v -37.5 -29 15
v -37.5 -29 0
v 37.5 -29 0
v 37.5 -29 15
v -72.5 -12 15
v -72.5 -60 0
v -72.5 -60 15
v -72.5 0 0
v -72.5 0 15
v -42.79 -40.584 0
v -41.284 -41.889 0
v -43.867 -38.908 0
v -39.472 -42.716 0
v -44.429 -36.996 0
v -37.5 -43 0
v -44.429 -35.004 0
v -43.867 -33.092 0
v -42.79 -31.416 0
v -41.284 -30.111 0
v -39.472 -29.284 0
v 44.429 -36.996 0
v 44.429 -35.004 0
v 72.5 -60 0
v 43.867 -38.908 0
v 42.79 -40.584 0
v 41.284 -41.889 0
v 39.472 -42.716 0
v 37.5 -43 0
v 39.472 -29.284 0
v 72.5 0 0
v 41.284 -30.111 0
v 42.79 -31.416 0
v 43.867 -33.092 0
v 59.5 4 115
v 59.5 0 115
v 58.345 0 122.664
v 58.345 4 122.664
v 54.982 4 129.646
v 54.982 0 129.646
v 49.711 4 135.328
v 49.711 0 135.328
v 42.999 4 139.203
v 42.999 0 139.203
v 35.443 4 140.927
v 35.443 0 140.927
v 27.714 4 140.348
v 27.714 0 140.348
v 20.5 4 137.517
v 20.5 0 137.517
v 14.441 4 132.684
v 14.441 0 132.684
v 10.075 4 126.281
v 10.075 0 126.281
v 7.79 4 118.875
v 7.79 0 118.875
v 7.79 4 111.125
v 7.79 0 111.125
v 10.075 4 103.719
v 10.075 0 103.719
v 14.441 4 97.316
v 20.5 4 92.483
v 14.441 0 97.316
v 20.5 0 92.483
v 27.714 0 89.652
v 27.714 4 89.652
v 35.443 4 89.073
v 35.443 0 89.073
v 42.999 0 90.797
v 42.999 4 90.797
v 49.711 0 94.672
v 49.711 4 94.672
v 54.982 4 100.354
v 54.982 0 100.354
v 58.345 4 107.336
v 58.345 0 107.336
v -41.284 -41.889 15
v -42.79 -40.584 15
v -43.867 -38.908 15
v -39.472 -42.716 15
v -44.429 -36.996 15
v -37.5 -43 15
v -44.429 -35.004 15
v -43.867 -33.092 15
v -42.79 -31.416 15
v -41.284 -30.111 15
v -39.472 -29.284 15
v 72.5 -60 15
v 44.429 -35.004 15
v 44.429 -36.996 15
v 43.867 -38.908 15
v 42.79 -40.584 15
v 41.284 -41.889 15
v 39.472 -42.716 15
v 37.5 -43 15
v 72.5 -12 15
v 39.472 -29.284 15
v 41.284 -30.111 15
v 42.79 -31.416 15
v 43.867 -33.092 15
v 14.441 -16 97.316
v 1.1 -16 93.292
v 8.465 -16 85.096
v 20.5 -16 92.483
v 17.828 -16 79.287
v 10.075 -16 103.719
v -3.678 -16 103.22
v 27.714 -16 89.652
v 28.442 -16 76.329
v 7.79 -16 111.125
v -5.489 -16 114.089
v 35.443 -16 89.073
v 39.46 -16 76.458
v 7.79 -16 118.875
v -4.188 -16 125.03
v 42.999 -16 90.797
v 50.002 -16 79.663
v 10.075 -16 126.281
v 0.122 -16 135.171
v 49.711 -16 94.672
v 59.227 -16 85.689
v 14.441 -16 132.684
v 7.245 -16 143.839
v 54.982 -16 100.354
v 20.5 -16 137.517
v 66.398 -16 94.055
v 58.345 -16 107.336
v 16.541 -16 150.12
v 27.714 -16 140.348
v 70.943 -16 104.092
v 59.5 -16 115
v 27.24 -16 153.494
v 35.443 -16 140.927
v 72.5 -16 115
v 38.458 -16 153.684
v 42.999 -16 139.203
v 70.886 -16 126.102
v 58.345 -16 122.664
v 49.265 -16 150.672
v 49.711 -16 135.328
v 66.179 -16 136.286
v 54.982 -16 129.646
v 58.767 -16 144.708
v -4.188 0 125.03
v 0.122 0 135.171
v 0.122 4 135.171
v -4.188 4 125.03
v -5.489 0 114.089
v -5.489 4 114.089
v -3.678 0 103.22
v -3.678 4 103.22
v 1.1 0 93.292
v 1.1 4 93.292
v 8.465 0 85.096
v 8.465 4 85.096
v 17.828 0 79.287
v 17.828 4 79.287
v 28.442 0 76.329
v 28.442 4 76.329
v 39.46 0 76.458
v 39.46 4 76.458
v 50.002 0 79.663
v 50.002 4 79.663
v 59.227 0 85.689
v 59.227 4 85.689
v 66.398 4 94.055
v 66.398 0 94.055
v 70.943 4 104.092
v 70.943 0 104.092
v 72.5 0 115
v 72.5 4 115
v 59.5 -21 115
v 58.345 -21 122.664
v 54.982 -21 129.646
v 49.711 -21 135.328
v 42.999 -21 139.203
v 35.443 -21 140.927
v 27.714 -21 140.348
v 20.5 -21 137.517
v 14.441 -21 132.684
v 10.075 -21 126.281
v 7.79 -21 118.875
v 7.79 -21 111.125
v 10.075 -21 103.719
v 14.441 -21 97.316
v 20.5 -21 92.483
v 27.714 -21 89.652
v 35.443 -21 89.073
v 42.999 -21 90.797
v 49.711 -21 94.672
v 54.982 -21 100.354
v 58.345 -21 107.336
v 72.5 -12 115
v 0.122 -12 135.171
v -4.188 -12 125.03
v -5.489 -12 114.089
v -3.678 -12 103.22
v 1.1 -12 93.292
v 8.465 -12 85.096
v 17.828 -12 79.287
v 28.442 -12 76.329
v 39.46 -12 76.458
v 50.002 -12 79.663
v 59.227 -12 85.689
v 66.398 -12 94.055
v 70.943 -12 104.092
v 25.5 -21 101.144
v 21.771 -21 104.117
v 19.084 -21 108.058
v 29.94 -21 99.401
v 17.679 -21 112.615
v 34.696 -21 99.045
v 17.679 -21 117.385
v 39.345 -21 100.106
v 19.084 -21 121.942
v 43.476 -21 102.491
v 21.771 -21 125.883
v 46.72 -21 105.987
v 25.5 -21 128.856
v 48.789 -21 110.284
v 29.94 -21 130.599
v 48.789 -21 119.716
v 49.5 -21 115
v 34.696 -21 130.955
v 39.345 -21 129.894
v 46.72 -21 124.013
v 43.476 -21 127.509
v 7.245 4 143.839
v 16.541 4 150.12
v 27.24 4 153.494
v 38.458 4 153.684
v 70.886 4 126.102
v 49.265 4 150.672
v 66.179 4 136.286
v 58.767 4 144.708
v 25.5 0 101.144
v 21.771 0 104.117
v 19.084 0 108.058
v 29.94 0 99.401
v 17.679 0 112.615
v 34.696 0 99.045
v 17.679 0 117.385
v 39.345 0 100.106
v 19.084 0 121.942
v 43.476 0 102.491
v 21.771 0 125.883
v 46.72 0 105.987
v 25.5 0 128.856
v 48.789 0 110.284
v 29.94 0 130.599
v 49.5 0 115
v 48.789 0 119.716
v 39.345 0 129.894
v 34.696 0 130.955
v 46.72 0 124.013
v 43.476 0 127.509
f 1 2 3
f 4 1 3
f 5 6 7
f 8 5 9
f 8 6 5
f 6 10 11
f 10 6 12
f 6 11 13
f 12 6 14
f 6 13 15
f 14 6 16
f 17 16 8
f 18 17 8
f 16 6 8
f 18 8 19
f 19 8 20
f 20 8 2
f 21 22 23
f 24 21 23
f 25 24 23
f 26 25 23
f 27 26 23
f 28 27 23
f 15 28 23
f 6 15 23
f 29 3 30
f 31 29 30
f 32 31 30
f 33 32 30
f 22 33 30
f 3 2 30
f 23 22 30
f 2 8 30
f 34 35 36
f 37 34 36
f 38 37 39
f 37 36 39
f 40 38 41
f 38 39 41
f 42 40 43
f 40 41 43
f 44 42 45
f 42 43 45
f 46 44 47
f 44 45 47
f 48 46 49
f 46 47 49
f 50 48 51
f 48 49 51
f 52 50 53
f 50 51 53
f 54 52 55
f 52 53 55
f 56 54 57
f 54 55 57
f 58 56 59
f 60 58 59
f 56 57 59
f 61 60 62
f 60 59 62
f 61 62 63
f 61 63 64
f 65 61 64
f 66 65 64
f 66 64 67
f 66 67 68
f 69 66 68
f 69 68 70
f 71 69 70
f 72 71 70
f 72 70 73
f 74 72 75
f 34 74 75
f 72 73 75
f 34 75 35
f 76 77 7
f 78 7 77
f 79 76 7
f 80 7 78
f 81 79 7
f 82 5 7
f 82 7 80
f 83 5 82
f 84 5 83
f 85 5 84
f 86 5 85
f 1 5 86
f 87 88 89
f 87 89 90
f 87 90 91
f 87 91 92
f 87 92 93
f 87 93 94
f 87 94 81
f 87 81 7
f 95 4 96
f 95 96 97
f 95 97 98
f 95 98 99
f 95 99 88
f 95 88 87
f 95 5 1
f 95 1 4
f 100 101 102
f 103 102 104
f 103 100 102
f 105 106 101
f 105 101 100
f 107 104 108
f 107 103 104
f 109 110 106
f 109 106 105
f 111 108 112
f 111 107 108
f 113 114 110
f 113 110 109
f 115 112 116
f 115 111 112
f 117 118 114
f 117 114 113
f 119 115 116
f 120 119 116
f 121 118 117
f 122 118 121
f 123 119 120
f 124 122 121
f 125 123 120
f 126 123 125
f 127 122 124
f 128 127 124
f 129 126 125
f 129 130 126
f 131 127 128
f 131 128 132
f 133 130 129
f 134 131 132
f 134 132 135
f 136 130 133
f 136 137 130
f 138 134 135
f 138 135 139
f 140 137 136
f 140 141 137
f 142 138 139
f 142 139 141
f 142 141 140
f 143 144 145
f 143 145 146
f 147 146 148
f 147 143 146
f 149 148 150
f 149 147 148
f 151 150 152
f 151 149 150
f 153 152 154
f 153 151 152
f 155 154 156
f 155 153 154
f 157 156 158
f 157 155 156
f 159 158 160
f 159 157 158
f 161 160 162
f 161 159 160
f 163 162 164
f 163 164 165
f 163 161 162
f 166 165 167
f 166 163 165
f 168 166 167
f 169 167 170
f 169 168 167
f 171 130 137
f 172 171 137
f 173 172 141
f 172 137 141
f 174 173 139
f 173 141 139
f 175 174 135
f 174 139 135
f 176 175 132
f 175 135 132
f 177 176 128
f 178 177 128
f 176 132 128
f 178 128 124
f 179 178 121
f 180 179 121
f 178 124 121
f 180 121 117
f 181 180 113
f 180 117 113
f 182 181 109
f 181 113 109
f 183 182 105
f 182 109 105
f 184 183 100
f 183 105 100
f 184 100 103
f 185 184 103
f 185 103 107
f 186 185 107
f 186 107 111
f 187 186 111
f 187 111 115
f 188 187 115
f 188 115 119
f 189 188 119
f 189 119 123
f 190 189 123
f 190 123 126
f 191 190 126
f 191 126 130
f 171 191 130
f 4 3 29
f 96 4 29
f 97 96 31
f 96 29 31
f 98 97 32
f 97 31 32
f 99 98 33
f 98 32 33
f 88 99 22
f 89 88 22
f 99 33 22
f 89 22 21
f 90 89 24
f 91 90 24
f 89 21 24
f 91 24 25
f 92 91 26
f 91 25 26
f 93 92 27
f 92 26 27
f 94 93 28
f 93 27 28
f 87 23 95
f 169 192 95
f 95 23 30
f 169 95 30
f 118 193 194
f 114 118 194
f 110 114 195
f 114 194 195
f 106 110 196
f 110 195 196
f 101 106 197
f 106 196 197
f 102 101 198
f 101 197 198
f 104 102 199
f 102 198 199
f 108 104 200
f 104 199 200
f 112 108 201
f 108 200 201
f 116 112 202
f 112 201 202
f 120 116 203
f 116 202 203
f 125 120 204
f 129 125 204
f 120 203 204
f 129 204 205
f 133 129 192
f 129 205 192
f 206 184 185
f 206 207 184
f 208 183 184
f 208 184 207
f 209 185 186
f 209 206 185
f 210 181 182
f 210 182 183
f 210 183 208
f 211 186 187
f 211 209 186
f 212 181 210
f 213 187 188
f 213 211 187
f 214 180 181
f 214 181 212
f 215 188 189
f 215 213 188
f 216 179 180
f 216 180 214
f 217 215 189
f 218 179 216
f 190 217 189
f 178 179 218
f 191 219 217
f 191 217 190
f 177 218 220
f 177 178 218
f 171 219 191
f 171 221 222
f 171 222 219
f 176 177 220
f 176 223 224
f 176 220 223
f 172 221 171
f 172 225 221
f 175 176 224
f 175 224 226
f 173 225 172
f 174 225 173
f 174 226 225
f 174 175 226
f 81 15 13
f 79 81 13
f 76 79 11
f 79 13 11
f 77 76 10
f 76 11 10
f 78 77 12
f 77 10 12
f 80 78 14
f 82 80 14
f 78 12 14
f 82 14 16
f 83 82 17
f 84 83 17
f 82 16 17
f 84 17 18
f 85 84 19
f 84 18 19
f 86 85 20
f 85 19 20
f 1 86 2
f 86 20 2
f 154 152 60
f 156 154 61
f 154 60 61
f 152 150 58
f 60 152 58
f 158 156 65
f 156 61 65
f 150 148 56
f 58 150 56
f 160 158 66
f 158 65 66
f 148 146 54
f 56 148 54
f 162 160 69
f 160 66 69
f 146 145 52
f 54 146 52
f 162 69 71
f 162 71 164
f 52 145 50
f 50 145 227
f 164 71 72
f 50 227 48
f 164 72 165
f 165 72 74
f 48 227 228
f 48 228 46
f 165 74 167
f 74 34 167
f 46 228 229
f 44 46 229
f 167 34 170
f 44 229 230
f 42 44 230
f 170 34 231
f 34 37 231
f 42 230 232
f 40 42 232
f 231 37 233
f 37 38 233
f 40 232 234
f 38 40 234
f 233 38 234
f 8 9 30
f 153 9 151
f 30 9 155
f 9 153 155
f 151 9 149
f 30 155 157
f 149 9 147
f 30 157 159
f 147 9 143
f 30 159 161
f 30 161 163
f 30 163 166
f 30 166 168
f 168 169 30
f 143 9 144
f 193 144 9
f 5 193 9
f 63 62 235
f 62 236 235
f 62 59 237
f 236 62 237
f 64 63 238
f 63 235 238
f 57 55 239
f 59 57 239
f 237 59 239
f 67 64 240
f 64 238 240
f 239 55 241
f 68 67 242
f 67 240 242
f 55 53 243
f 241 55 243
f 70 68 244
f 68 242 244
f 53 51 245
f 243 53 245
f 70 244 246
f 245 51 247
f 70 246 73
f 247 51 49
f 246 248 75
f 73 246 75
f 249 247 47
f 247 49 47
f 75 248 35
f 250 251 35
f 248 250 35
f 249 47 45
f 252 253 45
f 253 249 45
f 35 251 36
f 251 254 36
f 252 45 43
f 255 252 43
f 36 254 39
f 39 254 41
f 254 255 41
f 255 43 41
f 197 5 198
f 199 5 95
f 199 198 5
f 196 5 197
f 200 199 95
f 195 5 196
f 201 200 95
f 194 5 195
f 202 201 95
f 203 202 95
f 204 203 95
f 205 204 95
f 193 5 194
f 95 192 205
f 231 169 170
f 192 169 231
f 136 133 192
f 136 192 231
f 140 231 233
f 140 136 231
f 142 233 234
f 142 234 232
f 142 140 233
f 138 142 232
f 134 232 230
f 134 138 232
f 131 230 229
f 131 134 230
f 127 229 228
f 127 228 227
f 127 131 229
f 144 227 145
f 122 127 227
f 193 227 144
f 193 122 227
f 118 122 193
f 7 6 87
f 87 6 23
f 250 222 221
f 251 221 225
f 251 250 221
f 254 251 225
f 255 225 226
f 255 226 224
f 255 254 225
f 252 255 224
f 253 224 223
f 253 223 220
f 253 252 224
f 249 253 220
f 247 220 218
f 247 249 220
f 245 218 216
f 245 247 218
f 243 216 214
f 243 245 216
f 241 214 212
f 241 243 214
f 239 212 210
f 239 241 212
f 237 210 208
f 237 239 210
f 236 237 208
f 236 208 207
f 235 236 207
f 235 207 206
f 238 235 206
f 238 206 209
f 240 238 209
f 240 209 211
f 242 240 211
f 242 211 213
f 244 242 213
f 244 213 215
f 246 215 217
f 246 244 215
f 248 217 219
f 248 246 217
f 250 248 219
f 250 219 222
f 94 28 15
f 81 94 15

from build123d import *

# Parameters (mm, degrees)
F0_W          = 145
F0_H          = 48
F1_DEPTH      = 15
F0_H_2        = 12
F2_DEPTH      = 15
F4_DEPTH      = 12
F3_R          = 26
F5_DEPTH      = 16
F5_DEPTH_BACK = 4
F3_R_2        = 16
F6_DEPTH      = 21


with BuildPart() as f1:
    # F0 (on Top) → F1 (new body)
    with BuildSketch(Plane.XY):
        with Locations((0, -36)):
            Rectangle(F0_W, F0_H)
        with BuildLine():
            ThreePointArc((-37.5, -43), (-44.5, -36), (-37.5, -29))
            Line((-37.5, -29), (37.5, -29))
            ThreePointArc((37.5, -29), (44.5, -36), (37.5, -43))
            Line((37.5, -43), (-37.5, -43))
        make_face(mode=Mode.SUBTRACT)
    extrude(amount=F1_DEPTH)

    # F0 (on Top) → F2 (join)
    with BuildSketch(Plane.XY):
        with Locations((0, -6)):
            Rectangle(F0_W, F0_H_2)
    extrude(amount=F2_DEPTH)

    # F3 (on Front) → F4 (join)
    with BuildSketch(Plane.XZ):
        with BuildLine():
            Line((-72.5, 15), (-72.5, 0))
            Line((-72.5, 0), (72.5, 0))
            Line((72.5, 0), (72.5, 115))
            ThreePointArc((72.5, 115), (23.030062, 77.431657), (0.121518, 135.171191))
            Line((0.121518, 135.171191), (-72.5, 15))
        make_face()
    extrude(amount=F4_DEPTH)

    # F3 (on Front) → F5 (join, two sides)
    with BuildSketch(Plane.XZ) as f5_sk:
        with BuildLine():
            ThreePointArc((0.121518, 135.171191), (23.030062, 77.431657), (72.5, 115))
            ThreePointArc((72.5, 115), (43.969938, 152.568343), (0.121518, 135.171191))
        make_face()
        with Locations((33.5, 115)):
            Circle(F3_R, mode=Mode.SUBTRACT)
    extrude(amount=F5_DEPTH)
    extrude(f5_sk.sketch, amount=-F5_DEPTH_BACK)

    # F3 (on Front) → F6 (join)
    with BuildSketch(Plane.XZ):
        with Locations((33.5, 115)):
            Circle(F3_R)
        with Locations((33.5, 115)):
            Circle(F3_R_2, mode=Mode.SUBTRACT)
    extrude(amount=F6_DEPTH)


solid = f1.part
